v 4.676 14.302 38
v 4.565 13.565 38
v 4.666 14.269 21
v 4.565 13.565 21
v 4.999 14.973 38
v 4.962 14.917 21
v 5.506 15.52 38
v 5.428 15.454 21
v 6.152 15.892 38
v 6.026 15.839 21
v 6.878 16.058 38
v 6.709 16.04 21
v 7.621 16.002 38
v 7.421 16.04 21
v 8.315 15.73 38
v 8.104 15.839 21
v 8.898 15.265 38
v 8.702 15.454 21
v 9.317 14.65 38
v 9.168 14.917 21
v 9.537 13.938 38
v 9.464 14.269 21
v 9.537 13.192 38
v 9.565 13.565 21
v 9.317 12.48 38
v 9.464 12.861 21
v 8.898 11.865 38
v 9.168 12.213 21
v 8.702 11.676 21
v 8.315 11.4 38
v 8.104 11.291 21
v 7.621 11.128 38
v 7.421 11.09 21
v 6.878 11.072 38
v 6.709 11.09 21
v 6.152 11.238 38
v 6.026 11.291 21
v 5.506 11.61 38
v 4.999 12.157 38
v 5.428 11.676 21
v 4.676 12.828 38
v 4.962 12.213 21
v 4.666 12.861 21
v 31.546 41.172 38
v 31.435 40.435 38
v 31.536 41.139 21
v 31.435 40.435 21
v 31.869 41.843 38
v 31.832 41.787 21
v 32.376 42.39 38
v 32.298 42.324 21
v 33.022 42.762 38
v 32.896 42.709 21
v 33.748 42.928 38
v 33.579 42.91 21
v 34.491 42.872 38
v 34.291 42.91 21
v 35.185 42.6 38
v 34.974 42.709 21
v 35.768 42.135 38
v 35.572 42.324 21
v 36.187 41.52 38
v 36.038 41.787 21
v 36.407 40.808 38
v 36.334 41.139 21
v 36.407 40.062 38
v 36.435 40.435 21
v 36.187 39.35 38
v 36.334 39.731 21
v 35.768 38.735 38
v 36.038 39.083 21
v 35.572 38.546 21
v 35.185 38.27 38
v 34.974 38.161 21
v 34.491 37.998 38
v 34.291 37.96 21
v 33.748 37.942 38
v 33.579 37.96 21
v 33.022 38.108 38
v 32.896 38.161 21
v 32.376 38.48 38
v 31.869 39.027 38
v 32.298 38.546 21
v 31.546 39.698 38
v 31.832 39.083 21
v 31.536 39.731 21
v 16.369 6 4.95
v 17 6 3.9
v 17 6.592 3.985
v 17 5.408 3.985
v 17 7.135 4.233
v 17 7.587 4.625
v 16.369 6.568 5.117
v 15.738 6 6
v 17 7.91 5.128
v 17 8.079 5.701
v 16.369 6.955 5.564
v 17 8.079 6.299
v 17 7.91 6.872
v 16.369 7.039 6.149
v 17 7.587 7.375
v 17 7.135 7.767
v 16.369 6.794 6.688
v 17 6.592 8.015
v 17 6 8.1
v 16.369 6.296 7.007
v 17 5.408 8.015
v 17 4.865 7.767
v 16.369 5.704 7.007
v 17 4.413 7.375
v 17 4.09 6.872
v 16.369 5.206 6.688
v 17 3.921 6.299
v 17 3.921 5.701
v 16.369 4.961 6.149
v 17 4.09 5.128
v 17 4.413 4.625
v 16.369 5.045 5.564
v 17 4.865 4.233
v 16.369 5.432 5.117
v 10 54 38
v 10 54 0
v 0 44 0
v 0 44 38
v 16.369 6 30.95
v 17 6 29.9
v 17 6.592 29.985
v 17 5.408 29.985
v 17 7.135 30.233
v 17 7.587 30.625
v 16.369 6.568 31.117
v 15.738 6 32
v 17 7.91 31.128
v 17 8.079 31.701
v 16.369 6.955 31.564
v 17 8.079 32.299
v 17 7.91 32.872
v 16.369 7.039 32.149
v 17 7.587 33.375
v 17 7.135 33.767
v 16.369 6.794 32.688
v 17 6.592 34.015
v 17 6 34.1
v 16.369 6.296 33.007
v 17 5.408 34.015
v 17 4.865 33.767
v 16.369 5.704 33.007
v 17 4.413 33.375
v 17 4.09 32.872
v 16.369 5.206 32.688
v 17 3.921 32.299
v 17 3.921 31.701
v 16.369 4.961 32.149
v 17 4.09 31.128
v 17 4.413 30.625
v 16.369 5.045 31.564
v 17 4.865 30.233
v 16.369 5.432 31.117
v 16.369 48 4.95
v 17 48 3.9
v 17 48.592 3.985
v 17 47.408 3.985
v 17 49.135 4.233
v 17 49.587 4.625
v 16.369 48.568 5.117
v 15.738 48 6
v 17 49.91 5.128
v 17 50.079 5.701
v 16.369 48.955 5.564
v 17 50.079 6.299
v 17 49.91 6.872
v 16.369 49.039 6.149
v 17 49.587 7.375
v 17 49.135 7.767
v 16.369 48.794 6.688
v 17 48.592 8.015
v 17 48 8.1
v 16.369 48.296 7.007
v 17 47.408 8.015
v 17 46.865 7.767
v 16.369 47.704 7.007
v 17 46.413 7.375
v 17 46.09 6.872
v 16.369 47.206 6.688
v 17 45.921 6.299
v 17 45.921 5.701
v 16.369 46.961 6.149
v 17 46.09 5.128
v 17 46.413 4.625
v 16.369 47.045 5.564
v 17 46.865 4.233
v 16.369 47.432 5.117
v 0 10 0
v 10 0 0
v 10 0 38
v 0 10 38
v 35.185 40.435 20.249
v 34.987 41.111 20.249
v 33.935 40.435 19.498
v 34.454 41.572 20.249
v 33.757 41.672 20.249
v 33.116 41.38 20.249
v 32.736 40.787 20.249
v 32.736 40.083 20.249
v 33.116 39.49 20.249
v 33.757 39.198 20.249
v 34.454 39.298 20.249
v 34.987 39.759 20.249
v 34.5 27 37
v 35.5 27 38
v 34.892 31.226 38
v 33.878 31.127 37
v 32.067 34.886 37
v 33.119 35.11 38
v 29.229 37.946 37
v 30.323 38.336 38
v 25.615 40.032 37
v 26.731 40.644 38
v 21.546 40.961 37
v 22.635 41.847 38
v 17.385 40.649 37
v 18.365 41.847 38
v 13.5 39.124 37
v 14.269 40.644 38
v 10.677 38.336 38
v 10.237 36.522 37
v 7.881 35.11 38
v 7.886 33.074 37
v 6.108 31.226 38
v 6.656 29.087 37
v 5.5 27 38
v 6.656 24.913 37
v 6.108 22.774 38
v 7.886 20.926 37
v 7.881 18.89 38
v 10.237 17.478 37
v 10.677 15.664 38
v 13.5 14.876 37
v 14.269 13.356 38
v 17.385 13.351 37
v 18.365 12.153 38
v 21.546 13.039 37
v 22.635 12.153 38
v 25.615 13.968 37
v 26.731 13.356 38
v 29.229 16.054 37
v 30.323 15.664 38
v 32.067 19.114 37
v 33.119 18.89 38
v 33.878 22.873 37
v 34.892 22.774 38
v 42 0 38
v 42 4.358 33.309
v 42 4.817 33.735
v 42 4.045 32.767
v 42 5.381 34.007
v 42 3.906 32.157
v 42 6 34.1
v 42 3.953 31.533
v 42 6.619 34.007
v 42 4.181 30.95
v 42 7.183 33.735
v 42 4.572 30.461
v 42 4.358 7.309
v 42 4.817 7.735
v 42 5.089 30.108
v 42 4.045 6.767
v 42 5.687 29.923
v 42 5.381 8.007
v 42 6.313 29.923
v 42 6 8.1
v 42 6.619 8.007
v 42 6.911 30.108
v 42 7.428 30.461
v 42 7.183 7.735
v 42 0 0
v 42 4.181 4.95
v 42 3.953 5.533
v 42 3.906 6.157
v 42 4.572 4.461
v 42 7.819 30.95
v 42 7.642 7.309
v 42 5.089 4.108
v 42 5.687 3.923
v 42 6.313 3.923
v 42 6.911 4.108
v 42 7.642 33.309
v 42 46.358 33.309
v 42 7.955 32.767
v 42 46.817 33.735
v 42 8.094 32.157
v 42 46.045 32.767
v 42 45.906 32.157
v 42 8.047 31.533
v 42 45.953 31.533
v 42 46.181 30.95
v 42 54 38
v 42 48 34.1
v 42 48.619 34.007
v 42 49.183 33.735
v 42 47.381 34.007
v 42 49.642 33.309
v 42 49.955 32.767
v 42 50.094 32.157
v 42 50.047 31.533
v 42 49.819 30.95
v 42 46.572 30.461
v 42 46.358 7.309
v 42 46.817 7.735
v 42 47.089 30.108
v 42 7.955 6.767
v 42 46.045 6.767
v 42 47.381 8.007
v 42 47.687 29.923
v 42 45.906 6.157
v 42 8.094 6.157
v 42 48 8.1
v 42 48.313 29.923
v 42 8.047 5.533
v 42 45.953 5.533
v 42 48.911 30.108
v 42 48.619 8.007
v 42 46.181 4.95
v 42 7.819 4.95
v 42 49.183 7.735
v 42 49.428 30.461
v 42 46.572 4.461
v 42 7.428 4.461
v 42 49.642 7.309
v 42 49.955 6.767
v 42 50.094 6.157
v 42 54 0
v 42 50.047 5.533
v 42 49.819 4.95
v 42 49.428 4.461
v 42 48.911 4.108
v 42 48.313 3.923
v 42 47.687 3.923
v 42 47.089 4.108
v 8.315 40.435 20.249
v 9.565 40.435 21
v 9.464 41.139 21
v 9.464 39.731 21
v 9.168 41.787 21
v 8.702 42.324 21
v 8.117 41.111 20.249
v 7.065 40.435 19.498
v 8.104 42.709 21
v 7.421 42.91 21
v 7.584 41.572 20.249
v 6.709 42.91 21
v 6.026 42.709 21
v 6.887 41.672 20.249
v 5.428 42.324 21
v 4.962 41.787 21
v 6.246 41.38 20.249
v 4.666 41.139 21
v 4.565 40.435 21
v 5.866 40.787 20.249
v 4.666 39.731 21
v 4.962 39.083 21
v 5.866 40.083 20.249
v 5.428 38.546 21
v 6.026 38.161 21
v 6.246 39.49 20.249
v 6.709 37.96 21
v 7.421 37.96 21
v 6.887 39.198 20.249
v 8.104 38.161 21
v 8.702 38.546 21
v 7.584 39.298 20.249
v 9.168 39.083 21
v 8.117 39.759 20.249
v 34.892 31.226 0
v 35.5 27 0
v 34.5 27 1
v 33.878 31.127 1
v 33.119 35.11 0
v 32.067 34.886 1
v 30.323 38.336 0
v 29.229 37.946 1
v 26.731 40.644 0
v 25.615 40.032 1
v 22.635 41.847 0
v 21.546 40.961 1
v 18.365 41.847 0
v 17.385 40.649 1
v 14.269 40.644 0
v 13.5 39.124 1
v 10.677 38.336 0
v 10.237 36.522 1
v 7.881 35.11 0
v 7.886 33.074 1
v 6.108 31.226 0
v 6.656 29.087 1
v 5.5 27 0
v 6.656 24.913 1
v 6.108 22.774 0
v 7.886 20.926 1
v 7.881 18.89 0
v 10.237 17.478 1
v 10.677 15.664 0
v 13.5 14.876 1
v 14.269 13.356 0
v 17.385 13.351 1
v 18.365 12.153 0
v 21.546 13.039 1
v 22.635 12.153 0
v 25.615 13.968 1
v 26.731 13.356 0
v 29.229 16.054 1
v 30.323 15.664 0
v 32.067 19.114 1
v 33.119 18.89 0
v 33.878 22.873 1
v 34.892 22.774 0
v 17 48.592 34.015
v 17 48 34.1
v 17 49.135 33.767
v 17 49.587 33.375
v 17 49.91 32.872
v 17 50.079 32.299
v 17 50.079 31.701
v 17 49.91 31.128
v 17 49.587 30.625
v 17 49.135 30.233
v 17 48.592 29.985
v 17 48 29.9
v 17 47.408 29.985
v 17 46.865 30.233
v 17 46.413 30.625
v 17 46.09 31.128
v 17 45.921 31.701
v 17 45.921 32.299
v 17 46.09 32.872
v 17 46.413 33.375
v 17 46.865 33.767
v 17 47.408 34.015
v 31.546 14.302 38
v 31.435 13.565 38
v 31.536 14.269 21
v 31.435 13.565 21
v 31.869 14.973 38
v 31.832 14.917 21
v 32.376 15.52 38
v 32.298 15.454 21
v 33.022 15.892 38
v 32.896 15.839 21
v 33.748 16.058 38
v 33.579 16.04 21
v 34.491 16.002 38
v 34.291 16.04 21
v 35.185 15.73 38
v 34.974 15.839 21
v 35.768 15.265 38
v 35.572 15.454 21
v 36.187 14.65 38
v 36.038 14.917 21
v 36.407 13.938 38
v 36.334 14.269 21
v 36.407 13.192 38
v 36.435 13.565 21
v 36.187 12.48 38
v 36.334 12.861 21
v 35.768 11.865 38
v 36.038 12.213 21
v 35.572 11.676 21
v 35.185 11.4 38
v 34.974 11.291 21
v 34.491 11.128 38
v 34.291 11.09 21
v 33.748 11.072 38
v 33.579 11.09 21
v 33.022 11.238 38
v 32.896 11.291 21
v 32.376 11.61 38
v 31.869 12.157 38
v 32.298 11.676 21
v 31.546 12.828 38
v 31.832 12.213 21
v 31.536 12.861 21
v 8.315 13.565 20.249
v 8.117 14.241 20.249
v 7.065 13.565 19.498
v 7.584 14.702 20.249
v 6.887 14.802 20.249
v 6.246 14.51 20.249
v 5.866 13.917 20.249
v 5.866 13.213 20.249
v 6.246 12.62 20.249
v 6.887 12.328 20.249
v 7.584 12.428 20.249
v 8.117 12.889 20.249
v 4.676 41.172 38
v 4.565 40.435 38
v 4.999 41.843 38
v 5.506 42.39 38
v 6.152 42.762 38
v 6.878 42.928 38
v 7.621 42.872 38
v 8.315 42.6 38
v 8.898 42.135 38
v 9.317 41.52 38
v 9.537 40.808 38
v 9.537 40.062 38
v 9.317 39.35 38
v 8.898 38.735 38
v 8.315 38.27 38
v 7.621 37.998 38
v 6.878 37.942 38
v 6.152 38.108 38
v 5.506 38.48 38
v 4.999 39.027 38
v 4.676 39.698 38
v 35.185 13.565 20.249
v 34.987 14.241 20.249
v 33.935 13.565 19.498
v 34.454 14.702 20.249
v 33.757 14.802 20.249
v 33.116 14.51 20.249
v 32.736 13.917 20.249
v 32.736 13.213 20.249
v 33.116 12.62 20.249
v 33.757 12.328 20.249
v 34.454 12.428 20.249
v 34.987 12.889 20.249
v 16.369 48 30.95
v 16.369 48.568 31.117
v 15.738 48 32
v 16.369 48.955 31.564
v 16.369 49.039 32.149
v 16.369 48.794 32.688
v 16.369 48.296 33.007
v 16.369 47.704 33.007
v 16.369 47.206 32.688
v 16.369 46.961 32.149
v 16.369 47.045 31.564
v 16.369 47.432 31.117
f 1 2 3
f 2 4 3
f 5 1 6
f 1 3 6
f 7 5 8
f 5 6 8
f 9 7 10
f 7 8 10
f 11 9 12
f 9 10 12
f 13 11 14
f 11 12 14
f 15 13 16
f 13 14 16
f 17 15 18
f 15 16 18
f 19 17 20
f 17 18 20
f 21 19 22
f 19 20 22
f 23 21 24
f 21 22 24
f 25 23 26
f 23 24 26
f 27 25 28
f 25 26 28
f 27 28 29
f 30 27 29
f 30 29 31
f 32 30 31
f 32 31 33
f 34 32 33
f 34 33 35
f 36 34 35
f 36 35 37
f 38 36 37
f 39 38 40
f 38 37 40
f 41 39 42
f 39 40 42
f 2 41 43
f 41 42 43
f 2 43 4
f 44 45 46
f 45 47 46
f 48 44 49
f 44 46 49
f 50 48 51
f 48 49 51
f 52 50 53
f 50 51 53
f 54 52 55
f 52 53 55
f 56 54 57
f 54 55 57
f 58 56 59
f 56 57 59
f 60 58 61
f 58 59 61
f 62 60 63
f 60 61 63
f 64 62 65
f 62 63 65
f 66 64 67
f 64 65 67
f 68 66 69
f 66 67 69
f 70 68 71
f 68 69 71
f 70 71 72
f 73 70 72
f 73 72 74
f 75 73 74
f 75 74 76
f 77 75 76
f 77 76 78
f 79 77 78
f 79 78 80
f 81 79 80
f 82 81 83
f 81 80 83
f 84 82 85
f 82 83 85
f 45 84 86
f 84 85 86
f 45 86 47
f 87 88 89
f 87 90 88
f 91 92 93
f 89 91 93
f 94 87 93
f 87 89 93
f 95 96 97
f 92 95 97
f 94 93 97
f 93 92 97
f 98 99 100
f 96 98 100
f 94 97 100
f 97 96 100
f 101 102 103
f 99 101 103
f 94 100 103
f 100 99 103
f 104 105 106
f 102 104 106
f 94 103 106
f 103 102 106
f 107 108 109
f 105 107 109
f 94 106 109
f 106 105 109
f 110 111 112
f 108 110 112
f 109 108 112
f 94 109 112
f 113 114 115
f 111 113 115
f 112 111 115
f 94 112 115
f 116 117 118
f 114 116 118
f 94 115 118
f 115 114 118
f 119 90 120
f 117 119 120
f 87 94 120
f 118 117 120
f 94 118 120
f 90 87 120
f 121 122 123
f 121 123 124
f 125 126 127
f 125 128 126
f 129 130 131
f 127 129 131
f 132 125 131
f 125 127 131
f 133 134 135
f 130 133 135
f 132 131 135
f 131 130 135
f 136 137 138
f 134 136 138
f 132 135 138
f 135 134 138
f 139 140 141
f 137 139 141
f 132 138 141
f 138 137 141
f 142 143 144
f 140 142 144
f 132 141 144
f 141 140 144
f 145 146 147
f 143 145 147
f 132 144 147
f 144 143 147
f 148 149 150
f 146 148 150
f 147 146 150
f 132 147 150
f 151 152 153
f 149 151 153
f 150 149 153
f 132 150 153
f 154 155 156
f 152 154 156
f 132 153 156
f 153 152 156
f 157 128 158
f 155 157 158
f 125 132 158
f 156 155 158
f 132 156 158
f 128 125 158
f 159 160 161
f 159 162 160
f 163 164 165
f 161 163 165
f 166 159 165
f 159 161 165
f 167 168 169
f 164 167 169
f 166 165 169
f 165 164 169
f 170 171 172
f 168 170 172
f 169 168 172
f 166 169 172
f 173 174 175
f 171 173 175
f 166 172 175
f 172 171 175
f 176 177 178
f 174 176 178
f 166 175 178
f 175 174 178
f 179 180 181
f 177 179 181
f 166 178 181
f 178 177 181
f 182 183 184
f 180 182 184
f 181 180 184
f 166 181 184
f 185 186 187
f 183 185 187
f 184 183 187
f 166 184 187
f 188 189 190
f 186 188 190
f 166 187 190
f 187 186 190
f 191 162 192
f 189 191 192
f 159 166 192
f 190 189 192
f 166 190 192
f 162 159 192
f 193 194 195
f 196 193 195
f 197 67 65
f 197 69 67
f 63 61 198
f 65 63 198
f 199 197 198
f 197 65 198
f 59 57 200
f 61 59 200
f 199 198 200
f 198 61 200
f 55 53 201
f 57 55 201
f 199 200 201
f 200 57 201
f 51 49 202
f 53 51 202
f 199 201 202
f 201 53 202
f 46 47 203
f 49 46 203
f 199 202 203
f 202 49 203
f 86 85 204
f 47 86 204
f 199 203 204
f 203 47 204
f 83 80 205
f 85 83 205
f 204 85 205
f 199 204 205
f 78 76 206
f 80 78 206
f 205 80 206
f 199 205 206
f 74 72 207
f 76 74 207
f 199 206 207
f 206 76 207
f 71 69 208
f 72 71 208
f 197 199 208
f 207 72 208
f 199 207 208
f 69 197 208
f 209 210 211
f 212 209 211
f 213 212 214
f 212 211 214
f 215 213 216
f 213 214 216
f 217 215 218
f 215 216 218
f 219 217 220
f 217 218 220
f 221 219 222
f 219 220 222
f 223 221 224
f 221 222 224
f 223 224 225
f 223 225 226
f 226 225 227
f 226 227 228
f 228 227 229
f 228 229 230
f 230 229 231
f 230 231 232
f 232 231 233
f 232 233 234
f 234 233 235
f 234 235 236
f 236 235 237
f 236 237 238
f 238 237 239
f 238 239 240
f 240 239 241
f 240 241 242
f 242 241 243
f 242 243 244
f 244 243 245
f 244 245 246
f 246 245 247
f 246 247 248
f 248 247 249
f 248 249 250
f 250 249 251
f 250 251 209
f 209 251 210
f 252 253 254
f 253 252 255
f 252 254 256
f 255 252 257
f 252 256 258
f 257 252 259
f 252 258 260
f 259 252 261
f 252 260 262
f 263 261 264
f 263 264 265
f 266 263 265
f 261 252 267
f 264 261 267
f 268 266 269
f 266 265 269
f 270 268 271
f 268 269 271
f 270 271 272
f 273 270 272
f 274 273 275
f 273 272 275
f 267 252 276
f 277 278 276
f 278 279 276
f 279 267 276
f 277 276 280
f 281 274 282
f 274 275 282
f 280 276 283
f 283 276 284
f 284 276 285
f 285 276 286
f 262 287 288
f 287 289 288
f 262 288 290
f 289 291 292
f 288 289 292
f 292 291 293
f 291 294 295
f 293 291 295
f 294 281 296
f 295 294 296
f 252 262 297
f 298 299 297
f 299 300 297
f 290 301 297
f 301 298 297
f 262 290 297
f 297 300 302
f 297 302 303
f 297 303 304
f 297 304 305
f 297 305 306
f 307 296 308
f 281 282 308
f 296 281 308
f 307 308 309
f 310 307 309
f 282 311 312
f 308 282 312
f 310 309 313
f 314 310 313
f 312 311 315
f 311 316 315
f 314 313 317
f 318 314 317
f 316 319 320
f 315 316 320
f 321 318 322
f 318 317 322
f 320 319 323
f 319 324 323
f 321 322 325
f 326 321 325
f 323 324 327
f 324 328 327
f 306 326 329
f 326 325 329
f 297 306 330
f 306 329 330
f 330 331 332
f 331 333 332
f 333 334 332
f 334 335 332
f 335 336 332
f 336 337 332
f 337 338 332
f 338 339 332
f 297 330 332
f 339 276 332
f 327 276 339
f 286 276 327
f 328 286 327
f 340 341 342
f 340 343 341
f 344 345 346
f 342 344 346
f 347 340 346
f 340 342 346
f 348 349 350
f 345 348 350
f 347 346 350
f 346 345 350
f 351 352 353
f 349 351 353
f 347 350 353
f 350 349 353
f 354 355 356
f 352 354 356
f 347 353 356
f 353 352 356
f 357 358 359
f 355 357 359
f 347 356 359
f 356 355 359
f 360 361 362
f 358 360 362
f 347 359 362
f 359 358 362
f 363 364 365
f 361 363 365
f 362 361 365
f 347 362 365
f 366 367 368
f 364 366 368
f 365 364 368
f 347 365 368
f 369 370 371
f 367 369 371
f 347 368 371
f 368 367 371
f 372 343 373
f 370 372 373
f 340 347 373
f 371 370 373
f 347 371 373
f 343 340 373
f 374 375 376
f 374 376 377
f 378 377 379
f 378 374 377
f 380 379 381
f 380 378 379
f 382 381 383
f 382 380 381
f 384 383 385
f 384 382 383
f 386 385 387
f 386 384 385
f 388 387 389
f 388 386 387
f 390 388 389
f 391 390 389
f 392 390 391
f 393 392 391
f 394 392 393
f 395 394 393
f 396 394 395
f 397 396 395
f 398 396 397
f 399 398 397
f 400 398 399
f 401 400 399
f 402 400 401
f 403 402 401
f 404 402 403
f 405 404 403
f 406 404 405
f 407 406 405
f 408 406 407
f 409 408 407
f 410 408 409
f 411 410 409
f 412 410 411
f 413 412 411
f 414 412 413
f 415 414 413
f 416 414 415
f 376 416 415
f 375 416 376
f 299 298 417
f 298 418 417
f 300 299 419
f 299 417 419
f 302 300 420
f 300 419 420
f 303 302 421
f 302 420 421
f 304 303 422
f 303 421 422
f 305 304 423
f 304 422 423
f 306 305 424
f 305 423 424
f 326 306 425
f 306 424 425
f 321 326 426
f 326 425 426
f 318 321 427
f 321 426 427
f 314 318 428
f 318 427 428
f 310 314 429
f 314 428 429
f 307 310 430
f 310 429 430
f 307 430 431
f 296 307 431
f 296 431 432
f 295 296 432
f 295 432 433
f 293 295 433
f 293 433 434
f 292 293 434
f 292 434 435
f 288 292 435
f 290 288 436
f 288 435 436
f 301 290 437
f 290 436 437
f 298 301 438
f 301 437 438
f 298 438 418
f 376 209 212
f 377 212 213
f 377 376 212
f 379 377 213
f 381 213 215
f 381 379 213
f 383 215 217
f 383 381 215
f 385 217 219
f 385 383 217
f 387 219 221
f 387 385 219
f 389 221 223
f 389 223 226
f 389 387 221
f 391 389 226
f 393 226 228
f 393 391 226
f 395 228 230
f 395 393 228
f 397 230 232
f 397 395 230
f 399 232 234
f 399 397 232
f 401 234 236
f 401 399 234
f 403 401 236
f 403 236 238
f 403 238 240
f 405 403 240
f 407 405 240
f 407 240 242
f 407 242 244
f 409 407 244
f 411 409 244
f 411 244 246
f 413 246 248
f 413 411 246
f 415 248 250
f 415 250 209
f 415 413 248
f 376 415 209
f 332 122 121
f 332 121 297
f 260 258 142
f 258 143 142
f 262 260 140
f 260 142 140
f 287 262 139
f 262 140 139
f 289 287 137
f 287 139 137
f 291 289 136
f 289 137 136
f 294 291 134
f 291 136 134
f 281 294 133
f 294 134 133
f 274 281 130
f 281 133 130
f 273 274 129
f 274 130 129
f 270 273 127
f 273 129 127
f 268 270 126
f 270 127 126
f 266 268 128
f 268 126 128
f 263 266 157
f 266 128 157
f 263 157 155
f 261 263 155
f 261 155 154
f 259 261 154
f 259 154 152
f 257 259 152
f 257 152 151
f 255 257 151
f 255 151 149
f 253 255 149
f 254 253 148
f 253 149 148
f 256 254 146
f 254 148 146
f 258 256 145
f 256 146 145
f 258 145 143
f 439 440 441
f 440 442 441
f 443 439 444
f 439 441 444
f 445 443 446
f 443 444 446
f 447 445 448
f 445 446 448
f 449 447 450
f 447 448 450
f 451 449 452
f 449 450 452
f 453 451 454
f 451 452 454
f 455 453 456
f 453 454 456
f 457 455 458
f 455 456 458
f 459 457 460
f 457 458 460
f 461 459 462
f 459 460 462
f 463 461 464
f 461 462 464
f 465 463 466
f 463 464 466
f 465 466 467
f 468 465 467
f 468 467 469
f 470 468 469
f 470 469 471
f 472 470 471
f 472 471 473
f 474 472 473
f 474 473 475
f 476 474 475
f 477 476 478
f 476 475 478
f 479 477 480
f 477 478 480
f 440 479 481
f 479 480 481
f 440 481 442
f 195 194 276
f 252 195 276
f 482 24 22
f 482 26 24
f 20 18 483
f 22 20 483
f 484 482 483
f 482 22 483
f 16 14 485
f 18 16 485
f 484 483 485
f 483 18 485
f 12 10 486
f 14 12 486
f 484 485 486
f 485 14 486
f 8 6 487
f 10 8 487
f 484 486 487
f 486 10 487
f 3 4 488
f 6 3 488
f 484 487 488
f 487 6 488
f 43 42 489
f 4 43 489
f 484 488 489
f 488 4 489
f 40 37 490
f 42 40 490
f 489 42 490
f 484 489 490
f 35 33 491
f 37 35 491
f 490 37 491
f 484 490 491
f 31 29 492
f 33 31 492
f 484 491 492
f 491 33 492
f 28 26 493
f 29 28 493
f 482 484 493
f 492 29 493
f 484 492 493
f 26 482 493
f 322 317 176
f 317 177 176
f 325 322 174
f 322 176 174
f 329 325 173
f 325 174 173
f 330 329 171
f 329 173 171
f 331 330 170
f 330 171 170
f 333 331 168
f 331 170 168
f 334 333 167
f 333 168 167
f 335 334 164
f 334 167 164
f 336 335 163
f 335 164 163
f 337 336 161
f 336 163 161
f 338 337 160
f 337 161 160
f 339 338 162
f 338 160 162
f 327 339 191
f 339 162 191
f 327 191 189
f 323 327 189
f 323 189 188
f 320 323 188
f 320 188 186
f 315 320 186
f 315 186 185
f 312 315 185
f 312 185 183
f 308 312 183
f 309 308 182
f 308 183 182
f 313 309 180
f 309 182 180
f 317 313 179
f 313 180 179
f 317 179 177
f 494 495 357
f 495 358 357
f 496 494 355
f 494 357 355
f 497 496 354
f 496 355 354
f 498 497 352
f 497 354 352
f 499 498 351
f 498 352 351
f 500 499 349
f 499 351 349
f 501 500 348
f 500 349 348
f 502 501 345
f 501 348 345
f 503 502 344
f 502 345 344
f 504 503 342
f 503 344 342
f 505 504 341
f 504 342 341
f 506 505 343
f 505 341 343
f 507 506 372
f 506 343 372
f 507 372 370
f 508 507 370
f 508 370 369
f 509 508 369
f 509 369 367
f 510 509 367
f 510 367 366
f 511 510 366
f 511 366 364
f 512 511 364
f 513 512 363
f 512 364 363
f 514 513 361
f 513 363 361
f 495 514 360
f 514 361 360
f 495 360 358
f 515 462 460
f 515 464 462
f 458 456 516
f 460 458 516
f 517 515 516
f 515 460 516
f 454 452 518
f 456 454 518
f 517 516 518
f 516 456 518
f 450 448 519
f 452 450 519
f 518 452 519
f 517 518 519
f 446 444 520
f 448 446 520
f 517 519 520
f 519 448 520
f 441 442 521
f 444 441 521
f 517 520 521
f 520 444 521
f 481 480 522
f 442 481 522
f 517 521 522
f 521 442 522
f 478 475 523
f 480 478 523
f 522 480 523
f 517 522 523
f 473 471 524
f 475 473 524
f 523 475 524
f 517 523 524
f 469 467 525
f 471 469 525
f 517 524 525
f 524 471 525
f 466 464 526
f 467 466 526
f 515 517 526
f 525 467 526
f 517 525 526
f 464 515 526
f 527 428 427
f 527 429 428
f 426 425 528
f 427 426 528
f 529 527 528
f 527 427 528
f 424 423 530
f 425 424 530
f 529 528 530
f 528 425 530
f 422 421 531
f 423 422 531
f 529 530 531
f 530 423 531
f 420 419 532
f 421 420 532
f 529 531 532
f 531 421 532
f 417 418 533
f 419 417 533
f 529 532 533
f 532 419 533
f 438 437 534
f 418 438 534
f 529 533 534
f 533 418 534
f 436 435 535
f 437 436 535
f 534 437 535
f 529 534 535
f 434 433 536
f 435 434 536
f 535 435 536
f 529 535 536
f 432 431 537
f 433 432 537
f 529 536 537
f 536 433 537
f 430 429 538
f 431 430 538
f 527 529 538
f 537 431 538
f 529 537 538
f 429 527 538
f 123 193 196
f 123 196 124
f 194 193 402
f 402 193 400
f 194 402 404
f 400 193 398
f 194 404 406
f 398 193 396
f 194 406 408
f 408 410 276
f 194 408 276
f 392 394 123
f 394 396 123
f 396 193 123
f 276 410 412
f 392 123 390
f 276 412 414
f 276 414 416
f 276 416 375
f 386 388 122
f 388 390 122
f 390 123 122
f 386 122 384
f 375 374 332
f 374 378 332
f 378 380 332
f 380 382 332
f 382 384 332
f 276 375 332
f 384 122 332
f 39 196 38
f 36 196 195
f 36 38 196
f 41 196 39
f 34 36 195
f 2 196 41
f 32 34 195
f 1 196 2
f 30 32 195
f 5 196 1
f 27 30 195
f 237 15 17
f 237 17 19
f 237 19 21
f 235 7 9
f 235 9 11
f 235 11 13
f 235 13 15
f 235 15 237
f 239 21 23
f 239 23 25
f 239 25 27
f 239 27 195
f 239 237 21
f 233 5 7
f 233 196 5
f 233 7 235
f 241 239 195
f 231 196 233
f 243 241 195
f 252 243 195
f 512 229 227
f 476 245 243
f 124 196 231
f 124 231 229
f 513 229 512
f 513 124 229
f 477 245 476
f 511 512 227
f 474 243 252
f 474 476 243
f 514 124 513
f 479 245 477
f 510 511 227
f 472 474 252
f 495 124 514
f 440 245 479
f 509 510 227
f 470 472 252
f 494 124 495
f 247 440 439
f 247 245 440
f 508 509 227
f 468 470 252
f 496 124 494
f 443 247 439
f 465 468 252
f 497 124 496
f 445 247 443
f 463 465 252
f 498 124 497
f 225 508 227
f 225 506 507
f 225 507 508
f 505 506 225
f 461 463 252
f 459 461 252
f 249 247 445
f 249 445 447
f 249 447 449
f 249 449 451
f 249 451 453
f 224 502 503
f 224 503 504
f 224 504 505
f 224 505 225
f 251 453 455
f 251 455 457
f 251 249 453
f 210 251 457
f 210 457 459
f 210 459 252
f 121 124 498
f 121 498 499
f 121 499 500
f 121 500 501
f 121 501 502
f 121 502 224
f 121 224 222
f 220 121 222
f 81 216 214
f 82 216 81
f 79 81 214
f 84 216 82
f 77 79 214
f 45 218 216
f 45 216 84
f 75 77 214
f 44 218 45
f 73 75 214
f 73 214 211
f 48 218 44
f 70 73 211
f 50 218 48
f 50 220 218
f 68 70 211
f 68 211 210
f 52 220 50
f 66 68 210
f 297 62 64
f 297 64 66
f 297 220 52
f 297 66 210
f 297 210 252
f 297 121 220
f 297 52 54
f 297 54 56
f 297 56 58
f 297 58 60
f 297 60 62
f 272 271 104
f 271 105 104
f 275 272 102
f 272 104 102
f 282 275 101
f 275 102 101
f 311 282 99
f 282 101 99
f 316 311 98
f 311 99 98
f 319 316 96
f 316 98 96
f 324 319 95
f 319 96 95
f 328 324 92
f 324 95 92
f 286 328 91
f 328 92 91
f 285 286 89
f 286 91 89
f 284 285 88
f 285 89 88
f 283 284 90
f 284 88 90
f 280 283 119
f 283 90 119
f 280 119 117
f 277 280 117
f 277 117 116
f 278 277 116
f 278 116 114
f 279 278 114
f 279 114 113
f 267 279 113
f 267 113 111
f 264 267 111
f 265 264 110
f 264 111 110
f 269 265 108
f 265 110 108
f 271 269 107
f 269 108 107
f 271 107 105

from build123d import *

# Parameters (mm, degrees)
SZKIC1_W                       = 42
SZKIC1_H                       = 54
SZKIC1_R                       = 14
DODANIE_WYCI_GNI_CIE1_DEPTH    = 38
SFAZOWANIE1_SIZE               = 1
OTW_R_GWINTOWANY_M6X1_01_D     = 5
OTW_R_GWINTOWANY_M6X1_01_DEPTH = 17
OTW_R_GWINTOWANY_M6X1_01_TIP   = 1.502151548
OTW_R_GWINTOWANY_M5X0_81_D     = 4.2
OTW_R_GWINTOWANY_M5X0_81_DEPTH = 25
OTW_R_GWINTOWANY_M5X0_81_TIP   = 1.2618073
SFAZOWANIE2_SIZE               = 10


with BuildPart() as part:
    # Szkic1 → Dodanie-wyciągnięcie1 (new body)
    with BuildSketch(Plane.XY):
        with Locations((21, 27)):
            Rectangle(SZKIC1_W, SZKIC1_H)
        with Locations((20.5, 27)):
            Circle(SZKIC1_R, mode=Mode.SUBTRACT)
    extrude(amount=DODANIE_WYCI_GNI_CIE1_DEPTH)

    # Sfazowanie1
    sfazowanie1_edges = [part.edges().sort_by_distance(p)[0] for p in [
        (6.5, 27, 0),
        (6.5, 27, 38),
    ]]
    chamfer(sfazowanie1_edges, length=SFAZOWANIE1_SIZE)

    # Otwór gwintowany M6x1.01
    with Locations(Plane.XY.offset(38)):
        with Locations((33.935028843, 40.435028843), (7.064971157, 40.435028843), (7.064971157, 13.564971157), (33.935028843, 13.564971157)):
            Hole(OTW_R_GWINTOWANY_M6X1_01_D / 2, depth=OTW_R_GWINTOWANY_M6X1_01_DEPTH)
            with Locations((0, 0, -(OTW_R_GWINTOWANY_M6X1_01_DEPTH + OTW_R_GWINTOWANY_M6X1_01_TIP / 2))):  # 118° drill point
                Cone(0, OTW_R_GWINTOWANY_M6X1_01_D / 2, OTW_R_GWINTOWANY_M6X1_01_TIP, mode=Mode.SUBTRACT)

    # Otwór gwintowany M5x0.81
    with Locations(Plane(origin=(42, 0, 0), x_dir=(0, 0, -1), z_dir=(1, 0, 0))):
        with Locations((-32, 48), (-6, 48), (-6, 6), (-32, 6)):
            Hole(OTW_R_GWINTOWANY_M5X0_81_D / 2, depth=OTW_R_GWINTOWANY_M5X0_81_DEPTH)
            with Locations((0, 0, -(OTW_R_GWINTOWANY_M5X0_81_DEPTH + OTW_R_GWINTOWANY_M5X0_81_TIP / 2))):  # 118° drill point
                Cone(0, OTW_R_GWINTOWANY_M5X0_81_D / 2, OTW_R_GWINTOWANY_M5X0_81_TIP, mode=Mode.SUBTRACT)

    # Sfazowanie2
    sfazowanie2_edges = [part.edges().sort_by_distance(p)[0] for p in [
        (0, 54, 19),
        (0, 0, 19),
    ]]
    chamfer(sfazowanie2_edges, length=SFAZOWANIE2_SIZE)


solid = part.part
